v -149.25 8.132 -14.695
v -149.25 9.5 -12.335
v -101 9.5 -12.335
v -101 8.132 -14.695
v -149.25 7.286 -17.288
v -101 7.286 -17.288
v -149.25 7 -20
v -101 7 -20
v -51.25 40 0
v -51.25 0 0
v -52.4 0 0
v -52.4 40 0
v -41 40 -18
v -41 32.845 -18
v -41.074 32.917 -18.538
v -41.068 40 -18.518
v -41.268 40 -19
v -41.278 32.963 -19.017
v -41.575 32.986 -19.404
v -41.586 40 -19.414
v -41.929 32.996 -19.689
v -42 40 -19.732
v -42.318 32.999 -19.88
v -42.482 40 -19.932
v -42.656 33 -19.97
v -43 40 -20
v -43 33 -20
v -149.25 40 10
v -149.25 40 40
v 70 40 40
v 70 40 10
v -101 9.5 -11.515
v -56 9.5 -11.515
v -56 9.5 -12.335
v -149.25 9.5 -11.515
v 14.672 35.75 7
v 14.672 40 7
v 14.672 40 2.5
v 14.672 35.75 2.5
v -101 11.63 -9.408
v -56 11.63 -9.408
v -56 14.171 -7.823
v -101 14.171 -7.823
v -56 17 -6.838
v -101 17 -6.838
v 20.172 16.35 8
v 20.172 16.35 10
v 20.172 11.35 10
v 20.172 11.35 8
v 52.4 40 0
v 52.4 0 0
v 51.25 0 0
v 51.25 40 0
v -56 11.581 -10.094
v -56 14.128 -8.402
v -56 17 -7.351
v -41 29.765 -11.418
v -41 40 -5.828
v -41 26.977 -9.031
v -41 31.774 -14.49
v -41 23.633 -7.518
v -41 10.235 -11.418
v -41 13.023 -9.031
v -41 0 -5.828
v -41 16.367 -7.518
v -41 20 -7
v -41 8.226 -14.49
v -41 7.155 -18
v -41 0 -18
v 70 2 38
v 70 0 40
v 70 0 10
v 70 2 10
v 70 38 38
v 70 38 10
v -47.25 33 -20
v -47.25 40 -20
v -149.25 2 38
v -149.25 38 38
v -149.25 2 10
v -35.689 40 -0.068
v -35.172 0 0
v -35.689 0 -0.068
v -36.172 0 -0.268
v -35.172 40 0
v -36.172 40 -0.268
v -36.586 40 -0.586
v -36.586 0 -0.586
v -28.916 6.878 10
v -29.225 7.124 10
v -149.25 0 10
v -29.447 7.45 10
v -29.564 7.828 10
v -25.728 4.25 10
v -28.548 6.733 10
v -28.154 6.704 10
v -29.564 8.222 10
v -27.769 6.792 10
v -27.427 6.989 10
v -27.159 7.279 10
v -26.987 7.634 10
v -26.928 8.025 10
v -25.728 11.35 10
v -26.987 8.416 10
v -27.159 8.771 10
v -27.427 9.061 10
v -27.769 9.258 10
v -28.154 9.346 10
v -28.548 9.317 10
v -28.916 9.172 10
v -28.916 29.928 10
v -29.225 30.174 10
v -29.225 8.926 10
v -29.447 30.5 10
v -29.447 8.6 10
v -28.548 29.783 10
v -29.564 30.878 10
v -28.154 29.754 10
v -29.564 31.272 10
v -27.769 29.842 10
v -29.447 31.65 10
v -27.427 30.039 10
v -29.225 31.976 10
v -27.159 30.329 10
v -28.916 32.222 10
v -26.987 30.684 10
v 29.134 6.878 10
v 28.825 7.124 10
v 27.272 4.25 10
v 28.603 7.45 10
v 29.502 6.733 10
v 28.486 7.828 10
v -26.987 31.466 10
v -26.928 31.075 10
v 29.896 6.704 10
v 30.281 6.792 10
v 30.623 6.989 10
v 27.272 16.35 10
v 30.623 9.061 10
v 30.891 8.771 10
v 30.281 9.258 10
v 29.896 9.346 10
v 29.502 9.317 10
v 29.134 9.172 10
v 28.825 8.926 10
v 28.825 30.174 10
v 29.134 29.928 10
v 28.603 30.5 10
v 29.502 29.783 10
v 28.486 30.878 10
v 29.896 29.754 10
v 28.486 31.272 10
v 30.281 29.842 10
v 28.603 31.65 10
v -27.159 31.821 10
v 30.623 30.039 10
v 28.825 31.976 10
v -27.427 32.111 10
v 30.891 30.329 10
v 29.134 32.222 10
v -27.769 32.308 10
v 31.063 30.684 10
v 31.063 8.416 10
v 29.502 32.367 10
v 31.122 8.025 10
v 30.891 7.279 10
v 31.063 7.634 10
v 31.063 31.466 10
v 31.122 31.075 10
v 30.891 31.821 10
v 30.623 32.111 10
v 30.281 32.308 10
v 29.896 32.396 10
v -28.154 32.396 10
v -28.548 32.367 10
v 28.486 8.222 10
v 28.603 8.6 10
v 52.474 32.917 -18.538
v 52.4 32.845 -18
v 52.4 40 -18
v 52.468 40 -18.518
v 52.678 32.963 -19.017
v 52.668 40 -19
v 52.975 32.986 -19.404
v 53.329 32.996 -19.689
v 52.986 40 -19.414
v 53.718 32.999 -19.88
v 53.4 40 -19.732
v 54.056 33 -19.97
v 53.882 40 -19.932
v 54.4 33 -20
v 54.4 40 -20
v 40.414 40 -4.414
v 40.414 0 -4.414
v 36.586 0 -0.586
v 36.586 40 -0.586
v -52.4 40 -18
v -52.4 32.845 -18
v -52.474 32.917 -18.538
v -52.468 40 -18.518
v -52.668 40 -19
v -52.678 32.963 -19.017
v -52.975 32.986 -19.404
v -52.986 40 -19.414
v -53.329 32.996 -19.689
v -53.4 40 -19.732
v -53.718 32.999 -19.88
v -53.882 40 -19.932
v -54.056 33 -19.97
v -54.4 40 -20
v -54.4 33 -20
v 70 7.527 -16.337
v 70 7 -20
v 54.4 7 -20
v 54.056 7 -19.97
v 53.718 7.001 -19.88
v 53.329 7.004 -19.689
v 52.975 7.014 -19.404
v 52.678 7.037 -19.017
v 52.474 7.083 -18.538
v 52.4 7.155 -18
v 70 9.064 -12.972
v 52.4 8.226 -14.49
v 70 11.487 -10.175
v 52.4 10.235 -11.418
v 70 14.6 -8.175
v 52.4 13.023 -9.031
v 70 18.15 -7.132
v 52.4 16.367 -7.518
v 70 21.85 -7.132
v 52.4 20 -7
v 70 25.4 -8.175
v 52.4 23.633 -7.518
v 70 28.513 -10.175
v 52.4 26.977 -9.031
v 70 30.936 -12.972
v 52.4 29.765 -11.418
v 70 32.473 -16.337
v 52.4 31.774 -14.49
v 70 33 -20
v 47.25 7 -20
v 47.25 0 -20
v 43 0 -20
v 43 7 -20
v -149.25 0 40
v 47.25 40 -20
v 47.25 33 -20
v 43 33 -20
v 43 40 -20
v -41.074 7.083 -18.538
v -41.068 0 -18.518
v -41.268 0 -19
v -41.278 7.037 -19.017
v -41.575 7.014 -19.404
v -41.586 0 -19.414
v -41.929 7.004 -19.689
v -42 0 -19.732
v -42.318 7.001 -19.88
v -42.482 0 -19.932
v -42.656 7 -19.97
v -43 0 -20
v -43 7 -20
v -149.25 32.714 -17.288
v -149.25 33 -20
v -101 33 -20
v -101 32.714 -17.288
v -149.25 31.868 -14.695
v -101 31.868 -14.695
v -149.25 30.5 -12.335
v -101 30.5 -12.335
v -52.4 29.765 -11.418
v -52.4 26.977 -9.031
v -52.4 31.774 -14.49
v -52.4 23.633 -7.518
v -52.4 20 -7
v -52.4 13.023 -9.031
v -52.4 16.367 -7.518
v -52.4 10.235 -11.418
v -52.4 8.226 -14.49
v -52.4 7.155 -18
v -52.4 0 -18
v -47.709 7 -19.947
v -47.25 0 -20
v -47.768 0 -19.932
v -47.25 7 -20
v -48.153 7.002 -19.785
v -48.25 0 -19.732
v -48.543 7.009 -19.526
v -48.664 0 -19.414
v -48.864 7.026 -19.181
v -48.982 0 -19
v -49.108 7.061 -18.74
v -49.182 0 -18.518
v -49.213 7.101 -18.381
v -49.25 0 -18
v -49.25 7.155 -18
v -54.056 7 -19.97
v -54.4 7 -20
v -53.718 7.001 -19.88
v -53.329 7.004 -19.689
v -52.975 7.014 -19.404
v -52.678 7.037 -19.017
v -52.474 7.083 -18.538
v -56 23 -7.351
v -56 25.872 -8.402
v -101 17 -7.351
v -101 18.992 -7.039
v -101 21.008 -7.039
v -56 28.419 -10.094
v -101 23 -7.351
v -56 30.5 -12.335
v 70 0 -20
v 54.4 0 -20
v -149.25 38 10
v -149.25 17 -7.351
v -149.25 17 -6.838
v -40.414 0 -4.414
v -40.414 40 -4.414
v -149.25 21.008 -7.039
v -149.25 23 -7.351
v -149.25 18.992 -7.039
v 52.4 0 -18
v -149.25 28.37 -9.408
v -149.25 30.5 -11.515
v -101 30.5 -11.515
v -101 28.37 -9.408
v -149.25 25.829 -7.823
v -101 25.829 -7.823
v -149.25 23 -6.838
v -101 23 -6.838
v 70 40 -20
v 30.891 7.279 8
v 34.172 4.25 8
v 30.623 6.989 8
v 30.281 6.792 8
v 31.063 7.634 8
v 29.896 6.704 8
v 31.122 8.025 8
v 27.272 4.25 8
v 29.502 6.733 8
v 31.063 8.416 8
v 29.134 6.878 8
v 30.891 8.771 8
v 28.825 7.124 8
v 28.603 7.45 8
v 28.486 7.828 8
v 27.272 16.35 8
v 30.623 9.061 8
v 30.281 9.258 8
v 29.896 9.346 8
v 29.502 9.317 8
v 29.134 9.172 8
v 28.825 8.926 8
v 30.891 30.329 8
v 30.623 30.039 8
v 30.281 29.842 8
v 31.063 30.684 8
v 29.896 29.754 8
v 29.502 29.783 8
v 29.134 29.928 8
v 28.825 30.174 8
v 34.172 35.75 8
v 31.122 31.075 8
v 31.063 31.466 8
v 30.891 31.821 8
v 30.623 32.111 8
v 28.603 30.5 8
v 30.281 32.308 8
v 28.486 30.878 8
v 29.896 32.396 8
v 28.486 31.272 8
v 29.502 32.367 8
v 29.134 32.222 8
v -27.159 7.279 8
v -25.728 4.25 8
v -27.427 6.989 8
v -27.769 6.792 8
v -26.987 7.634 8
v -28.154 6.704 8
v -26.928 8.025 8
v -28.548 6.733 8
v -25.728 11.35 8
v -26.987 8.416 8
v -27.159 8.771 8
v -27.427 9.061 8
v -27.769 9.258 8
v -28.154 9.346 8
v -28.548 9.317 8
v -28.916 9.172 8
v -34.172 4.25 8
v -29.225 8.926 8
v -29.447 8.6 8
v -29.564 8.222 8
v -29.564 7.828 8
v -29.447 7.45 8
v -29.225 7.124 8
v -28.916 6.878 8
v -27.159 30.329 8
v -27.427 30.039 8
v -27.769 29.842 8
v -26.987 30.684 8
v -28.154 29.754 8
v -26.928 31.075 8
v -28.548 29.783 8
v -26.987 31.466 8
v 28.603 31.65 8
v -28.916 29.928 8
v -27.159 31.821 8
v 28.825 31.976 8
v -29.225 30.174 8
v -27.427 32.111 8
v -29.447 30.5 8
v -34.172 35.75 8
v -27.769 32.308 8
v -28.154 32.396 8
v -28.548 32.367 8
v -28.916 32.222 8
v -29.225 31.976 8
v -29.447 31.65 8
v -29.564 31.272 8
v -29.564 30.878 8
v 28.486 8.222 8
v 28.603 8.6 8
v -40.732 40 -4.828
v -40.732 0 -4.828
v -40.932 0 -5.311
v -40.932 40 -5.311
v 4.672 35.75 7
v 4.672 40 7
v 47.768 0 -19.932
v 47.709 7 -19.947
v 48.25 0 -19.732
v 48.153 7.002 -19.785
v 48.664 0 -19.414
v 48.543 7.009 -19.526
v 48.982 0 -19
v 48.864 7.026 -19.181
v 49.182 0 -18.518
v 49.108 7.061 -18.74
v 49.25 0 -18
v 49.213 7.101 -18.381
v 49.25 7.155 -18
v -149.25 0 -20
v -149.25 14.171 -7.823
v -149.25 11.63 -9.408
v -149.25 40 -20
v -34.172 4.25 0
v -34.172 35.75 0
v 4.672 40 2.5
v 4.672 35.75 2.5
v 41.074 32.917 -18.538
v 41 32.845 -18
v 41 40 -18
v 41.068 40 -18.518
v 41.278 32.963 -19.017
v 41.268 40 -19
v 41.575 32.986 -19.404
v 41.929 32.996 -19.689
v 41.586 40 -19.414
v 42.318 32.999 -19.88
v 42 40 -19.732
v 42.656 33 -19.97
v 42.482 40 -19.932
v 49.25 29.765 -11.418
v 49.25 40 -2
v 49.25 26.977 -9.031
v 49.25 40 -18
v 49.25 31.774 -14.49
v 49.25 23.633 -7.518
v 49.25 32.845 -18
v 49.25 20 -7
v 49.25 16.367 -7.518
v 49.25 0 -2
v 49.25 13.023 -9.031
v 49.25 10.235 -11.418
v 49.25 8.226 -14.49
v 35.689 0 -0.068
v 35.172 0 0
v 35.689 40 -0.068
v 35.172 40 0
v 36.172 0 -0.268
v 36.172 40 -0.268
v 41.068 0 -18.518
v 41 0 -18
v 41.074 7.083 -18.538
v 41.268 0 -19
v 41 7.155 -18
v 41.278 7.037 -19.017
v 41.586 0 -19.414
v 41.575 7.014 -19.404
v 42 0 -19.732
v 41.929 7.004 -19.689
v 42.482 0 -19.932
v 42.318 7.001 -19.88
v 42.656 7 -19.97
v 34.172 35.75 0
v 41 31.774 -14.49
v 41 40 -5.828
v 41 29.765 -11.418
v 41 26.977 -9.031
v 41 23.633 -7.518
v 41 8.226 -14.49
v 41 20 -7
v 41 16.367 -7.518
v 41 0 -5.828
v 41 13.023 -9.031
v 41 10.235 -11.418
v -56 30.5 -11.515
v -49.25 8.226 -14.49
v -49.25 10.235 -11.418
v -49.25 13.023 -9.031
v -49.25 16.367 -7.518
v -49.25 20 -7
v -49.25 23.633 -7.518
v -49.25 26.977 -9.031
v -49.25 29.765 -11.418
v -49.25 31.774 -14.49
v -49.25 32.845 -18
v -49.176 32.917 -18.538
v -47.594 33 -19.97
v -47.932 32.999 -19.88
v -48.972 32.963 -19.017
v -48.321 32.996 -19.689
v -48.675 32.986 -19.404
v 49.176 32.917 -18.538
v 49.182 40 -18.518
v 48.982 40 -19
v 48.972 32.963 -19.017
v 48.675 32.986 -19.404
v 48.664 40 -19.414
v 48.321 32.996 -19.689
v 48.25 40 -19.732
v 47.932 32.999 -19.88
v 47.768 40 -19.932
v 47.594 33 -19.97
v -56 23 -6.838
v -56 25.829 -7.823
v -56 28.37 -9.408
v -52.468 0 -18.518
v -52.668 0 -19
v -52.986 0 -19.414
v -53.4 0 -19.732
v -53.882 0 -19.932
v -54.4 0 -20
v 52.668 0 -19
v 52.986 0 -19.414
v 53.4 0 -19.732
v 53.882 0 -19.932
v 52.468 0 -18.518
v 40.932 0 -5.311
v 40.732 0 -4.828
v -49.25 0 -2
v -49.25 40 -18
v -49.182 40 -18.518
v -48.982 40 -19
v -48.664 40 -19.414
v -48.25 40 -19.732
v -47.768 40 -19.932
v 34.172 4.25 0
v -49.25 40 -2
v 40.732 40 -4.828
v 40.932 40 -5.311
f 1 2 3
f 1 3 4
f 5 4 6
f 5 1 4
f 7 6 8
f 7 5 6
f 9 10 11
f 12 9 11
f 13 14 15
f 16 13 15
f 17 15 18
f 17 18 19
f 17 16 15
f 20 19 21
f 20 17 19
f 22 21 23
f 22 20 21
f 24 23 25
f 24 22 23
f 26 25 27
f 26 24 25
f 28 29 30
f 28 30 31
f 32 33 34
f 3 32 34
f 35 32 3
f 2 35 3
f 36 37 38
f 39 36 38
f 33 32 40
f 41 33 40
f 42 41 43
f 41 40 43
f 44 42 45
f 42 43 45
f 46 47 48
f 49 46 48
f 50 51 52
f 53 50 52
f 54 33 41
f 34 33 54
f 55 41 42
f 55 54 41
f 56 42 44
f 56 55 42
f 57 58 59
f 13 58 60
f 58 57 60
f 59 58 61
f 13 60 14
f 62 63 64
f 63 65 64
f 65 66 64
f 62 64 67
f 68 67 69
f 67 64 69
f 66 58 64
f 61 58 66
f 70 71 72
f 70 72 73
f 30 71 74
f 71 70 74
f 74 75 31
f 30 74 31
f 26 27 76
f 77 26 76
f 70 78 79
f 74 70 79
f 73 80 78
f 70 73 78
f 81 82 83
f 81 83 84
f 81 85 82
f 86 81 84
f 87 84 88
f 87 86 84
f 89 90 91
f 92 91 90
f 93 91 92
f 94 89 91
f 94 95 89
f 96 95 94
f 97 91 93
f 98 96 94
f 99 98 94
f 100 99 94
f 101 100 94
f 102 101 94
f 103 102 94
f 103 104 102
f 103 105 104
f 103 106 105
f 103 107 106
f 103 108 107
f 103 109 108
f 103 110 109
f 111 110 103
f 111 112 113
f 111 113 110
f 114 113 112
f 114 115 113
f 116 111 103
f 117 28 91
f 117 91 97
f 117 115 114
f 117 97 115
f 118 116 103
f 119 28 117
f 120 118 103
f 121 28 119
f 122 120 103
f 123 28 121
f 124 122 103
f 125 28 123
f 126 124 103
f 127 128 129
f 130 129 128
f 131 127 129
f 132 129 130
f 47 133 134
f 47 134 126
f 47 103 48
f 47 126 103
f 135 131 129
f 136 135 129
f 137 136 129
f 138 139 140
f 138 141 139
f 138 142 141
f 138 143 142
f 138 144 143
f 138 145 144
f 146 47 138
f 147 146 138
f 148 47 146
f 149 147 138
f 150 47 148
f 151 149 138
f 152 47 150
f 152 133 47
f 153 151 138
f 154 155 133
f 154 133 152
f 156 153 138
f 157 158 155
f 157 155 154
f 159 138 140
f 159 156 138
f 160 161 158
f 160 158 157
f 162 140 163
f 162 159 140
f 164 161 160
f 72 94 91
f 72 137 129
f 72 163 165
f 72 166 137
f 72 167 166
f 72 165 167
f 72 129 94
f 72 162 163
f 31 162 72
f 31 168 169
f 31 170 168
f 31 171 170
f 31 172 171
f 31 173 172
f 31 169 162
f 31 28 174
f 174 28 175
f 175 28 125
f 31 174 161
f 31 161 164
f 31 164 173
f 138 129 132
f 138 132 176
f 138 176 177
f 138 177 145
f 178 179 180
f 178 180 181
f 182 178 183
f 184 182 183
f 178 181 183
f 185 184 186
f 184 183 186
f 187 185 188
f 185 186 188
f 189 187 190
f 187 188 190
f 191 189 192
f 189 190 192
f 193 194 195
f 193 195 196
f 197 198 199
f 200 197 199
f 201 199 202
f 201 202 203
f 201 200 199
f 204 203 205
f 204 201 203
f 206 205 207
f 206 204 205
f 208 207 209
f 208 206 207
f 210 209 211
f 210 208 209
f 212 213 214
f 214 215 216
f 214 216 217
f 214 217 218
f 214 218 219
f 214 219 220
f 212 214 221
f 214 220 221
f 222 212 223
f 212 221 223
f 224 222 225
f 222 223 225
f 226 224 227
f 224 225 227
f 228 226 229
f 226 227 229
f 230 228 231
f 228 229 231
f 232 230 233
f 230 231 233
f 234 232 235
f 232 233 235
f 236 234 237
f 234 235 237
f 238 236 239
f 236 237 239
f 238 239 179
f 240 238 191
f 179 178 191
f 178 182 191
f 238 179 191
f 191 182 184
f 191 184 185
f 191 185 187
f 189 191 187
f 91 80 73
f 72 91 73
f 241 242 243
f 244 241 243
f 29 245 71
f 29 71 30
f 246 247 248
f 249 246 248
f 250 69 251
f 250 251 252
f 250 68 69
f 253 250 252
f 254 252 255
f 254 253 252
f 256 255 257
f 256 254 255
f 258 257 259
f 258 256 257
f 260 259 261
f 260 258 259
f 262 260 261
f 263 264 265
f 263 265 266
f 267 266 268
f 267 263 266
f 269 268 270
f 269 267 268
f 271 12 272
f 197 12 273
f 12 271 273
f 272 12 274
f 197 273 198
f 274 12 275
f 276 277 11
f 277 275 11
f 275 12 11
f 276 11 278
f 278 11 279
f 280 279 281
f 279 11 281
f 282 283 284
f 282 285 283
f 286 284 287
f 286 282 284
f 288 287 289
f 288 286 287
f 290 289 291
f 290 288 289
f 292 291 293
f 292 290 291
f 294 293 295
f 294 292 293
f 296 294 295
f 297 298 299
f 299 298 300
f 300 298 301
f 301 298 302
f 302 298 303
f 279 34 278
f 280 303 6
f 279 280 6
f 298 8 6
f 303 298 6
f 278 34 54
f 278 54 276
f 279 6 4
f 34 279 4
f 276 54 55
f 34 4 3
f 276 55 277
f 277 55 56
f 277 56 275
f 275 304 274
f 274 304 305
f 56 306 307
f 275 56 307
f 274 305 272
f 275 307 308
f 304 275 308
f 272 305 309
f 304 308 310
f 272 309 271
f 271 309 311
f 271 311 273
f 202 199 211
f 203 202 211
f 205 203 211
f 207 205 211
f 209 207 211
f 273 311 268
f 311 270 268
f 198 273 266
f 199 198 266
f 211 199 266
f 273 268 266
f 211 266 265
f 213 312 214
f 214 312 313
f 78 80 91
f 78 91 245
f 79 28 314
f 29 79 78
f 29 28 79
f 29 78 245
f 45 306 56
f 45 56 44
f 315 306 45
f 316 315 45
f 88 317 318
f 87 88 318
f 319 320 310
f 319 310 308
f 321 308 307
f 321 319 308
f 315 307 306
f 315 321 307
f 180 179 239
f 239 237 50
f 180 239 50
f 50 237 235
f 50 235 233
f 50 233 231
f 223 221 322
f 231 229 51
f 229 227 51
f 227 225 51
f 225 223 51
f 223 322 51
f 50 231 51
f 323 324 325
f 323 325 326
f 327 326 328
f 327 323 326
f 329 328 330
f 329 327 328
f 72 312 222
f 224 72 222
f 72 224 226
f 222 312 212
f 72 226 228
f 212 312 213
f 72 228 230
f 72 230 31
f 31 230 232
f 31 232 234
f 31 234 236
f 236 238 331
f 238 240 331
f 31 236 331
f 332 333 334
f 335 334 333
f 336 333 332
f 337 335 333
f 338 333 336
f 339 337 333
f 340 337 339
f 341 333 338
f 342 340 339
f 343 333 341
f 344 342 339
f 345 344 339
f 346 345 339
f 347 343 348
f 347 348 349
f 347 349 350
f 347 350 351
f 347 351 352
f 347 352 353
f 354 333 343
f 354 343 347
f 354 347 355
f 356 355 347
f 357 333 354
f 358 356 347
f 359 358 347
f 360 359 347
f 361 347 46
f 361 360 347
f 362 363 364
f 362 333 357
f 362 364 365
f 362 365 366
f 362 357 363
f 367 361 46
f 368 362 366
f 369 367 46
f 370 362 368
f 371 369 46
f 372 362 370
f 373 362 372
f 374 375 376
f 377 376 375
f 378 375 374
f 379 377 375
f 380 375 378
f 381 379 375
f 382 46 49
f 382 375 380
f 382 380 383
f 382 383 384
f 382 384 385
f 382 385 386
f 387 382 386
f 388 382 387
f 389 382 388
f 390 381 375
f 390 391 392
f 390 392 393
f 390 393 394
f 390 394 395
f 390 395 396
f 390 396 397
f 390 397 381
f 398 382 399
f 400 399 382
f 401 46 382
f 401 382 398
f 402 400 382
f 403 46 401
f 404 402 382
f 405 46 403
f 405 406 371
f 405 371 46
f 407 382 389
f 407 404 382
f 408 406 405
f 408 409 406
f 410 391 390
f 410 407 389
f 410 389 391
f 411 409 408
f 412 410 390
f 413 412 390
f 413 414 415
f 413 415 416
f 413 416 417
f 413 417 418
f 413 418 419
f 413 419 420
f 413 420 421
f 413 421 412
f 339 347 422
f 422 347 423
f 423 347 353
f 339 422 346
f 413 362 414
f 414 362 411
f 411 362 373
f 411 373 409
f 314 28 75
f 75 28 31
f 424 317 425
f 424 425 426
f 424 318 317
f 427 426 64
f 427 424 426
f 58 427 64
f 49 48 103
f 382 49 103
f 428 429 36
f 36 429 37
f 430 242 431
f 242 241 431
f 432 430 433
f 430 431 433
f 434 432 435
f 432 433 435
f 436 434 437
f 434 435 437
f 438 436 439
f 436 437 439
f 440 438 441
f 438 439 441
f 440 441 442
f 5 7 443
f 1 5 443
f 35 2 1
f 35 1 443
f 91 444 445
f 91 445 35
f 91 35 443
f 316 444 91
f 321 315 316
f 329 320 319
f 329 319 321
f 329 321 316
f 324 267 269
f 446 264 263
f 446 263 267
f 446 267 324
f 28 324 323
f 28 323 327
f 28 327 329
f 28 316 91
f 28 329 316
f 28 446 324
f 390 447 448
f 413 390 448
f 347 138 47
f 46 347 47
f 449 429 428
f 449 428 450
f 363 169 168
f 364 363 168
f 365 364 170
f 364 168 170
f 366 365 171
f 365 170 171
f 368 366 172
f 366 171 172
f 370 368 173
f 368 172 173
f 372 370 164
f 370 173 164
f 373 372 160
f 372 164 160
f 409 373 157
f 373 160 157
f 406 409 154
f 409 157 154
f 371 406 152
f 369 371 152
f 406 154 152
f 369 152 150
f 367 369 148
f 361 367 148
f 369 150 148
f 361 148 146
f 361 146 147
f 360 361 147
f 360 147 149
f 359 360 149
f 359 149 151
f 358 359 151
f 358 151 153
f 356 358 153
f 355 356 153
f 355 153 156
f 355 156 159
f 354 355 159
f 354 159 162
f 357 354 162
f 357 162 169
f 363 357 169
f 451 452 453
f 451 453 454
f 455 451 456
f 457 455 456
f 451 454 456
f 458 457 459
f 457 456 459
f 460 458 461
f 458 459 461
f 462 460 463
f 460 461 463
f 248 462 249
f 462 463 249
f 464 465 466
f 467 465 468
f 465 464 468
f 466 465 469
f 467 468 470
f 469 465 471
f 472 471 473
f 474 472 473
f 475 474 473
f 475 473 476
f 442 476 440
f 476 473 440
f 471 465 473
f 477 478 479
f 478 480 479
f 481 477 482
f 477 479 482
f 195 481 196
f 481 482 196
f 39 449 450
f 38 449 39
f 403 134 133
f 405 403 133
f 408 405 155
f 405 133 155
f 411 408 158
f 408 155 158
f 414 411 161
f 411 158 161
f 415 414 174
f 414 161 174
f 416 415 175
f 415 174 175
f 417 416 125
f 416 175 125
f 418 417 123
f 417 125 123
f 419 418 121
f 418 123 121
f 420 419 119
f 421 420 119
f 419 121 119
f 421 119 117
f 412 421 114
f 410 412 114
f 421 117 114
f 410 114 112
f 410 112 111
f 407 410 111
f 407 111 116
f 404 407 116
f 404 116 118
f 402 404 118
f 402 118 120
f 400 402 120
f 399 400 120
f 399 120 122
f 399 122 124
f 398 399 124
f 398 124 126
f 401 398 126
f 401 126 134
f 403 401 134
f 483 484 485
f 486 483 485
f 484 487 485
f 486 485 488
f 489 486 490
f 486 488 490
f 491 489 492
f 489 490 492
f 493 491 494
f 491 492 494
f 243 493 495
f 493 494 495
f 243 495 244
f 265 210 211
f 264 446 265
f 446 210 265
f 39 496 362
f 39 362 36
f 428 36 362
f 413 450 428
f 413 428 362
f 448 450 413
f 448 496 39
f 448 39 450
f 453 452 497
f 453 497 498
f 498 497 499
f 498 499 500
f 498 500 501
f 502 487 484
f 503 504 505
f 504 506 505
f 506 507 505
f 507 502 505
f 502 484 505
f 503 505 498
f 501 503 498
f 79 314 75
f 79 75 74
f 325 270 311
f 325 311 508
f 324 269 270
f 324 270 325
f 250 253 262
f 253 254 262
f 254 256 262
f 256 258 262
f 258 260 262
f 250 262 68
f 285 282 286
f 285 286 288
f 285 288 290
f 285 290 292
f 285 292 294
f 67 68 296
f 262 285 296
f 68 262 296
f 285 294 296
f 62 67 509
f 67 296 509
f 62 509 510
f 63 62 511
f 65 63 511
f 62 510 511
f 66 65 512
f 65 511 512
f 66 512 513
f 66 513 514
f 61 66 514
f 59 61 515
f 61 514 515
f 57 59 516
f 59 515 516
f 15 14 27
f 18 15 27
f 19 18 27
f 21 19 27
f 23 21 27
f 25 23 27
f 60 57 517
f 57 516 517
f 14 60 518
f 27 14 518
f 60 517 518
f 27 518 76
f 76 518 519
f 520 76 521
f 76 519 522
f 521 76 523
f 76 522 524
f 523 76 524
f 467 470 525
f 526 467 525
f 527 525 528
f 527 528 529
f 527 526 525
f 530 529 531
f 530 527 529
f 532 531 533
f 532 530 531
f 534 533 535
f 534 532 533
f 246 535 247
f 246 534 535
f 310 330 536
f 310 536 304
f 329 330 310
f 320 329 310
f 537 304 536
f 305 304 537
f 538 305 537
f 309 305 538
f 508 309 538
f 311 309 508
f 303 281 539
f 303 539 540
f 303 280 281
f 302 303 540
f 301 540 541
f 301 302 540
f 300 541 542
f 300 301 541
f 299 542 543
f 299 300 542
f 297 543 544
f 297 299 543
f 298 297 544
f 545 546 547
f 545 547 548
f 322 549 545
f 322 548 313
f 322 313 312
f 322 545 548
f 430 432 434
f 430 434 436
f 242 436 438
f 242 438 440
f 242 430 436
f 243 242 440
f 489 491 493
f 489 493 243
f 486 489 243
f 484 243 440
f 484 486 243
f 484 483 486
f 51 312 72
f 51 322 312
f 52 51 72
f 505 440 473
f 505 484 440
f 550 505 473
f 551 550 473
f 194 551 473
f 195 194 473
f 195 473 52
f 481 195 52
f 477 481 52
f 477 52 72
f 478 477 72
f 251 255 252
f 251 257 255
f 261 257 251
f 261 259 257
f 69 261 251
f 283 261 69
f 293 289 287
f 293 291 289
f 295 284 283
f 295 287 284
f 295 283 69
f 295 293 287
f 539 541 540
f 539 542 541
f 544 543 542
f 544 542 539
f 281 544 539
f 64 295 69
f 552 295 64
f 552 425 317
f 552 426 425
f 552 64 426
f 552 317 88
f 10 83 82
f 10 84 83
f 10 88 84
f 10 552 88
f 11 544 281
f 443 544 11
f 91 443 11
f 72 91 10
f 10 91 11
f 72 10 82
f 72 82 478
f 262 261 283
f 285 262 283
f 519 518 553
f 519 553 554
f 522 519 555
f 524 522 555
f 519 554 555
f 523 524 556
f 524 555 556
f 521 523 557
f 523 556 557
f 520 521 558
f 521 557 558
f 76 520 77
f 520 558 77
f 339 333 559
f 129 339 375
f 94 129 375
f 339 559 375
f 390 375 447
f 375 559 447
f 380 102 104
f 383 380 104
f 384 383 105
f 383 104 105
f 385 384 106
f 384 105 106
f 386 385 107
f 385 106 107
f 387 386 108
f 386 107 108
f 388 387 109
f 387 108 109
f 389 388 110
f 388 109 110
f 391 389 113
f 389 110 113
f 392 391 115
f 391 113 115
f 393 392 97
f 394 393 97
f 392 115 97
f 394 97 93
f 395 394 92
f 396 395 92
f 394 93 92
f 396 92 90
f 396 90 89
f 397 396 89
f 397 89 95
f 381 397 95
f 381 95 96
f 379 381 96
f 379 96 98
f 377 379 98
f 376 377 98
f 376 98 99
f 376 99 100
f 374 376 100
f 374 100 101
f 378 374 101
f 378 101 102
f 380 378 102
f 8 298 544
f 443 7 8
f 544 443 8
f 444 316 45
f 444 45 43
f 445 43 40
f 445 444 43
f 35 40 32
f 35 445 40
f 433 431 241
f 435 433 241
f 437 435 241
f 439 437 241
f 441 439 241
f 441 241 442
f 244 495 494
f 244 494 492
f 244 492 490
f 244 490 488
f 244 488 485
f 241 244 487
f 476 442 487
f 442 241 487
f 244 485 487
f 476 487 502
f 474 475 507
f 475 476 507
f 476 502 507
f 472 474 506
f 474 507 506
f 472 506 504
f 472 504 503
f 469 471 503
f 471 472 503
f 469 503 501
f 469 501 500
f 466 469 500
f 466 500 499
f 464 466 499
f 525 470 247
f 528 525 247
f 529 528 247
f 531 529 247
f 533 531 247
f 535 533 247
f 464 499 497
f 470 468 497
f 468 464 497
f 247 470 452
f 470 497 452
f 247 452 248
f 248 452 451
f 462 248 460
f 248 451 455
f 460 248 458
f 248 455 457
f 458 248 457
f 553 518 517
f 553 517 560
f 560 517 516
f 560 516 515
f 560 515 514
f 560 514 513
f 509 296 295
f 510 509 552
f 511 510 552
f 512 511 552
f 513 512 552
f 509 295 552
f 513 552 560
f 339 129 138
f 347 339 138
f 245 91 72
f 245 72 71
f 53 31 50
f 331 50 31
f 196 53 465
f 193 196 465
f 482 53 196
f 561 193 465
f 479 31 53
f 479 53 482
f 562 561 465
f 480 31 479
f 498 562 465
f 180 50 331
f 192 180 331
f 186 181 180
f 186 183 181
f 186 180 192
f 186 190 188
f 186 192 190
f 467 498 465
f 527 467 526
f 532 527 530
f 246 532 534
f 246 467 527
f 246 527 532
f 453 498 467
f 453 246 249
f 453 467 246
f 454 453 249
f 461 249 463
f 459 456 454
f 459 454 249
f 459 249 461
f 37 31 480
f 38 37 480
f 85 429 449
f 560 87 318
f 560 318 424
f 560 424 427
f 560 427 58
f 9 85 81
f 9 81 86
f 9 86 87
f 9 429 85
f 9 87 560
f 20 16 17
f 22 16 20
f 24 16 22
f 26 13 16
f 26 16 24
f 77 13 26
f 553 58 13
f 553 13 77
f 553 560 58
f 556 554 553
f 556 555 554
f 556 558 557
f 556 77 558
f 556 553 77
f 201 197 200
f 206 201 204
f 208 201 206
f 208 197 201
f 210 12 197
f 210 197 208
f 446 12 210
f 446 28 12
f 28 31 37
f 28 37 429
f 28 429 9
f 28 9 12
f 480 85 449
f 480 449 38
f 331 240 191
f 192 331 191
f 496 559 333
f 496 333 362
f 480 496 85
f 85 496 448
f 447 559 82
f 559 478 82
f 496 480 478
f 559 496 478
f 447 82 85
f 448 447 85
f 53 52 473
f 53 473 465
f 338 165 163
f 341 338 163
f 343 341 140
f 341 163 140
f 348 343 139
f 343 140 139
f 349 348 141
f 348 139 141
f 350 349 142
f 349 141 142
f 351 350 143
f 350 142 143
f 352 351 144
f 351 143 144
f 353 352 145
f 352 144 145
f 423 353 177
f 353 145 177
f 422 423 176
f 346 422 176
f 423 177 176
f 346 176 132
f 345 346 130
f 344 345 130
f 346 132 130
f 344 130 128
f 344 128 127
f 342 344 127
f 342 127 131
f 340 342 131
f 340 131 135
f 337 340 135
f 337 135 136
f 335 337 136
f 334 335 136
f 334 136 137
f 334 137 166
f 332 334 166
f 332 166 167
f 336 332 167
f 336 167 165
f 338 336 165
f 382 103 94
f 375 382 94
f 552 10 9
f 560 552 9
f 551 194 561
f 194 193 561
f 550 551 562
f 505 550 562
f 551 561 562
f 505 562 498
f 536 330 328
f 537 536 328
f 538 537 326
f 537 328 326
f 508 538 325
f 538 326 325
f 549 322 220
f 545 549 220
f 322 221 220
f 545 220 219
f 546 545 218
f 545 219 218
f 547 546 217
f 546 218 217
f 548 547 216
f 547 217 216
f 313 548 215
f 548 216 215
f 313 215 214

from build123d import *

# Parameters (mm, degrees)
BOSS_EXTRUDE1_DEPTH     = 40
SKETCH2_R               = 13
CUT_EXTRUDE1_DEPTH      = 210.771304043
CHAMFER1_SIZE           = 5
FILLET3_R               = 2
CHAMFER2_SIZE           = 2
CUT_EXTRUDE2_REACH      = 126.101
CUT_EXTRUDE2_END_RADIUS = 13.5
SKETCH3_W               = 45
SKETCH3_H               = 7.5
SKETCH4_W               = 68.34314575
SKETCH4_H               = 31.5
CUT_EXTRUDE3_DEPTH      = 8
BOSS_EXTRUDE2_START     = 48.25
BOSS_EXTRUDE2_DEPTH     = 48.25
SKETCH6_W               = 28
SKETCH6_H               = 36
CUT_EXTRUDE4_DEPTH      = 257.563954128
CUT_EXTRUDE5_REACH      = 161.611
SKETCH7_W               = 10
SKETCH7_H               = 4.5
SKETCH9_R               = 1.325
CUT_EXTRUDE6_DEPTH      = 158.402549261
SKETCH10_W              = 31
SKETCH10_H              = 40
CUT_EXTRUDE7_DEPTH      = 166.757541331


with BuildPart() as part:
    # Sketch1 → Boss-Extrude1 (new body)
    with BuildSketch(Plane(origin=(0, 0, 0), x_dir=(1, 0, 0), z_dir=(0, 1, 0))):
        Polygon((41, 0), (-41, 0), (-41, 20), (-49.25, 20), (-49.25, 0), (-52.4, 0), (-52.4, 20), (-101, 20), (-101, -40), (101, -40), (101, 20), (52.4, 20), (52.4, 0), (49.25, 0), (49.25, 20), (41, 20), align=None)
    extrude(amount=BOSS_EXTRUDE1_DEPTH)

    # Sketch2 → Cut-Extrude1 (cut, through all)
    with BuildSketch(Plane.ZY.offset(101)):
        with Locations((-20, 20)):
            Circle(SKETCH2_R)
    extrude(amount=-CUT_EXTRUDE1_DEPTH, mode=Mode.SUBTRACT)

    # Chamfer1
    chamfer1_edges = [part.edges().sort_by_distance(p)[0] for p in [
        (-41, 20, 0),
        (41, 20, 0),
    ]]
    chamfer(chamfer1_edges, length=CHAMFER1_SIZE)

    # Fillet3
    fillet3_edges = [part.edges().sort_by_distance(p)[0] for p in [
        (41, 36.5, -20),
        (49.25, 36.5, -20),
        (52.4, 36.5, -20),
        (-52.4, 36.5, -20),
        (-49.25, 36.5, -20),
        (-41, 36.5, -20),
        (41, 3.5, -20),
        (49.25, 3.5, -20),
        (52.4, 3.5, -20),
        (-52.4, 3.5, -20),
        (-49.25, 3.5, -20),
        (-41, 3.5, -20),
        (-36, 20, 0),
        (36, 20, 0),
        (41, 20, -5),
        (-41, 20, -5),
    ]]
    fillet(fillet3_edges, radius=FILLET3_R)

    # Chamfer2
    chamfer2_edges = [part.edges().sort_by_distance(p)[0] for p in [
        (49.25, 20, 0),
        (-49.25, 20, 0),
    ]]
    chamfer(chamfer2_edges, length=CHAMFER2_SIZE)

    # Cut-Extrude2: up to this cylinder (the profile starts inside it)
    cut_extrude2_end = Plane(origin=(-78.5, 20, -20), z_dir=(-1, 0, 0)) * Cylinder(CUT_EXTRUDE2_END_RADIUS, 280.202, mode=Mode.PRIVATE)
    # Sketch3 → Cut-Extrude2 (cut, up to the surface)
    with BuildSketch(Plane(origin=(0, 0, -20), x_dir=(-1, 0, 0), z_dir=(0, 0, -1)), mode=Mode.PRIVATE) as cut_extrude2_sk1:
        with Locations((78.5, 13.25)):
            Rectangle(SKETCH3_W, SKETCH3_H)
    cut_extrude2_tool1 = extrude(cut_extrude2_sk1.sketch, amount=-CUT_EXTRUDE2_REACH, mode=Mode.PRIVATE) & cut_extrude2_end
    add(cut_extrude2_tool1.solids().sort_by_distance((-78.5, 13.25, -20))[0], mode=Mode.SUBTRACT)
    # Sketch3 → Cut-Extrude2 (cut, up to the surface)
    with BuildSketch(Plane(origin=(0, 0, -20), x_dir=(-1, 0, 0), z_dir=(0, 0, -1)), mode=Mode.PRIVATE) as cut_extrude2_sk2:
        with Locations((78.5, 26.75)):
            Rectangle(SKETCH3_W, SKETCH3_H)
    cut_extrude2_tool2 = extrude(cut_extrude2_sk2.sketch, amount=-CUT_EXTRUDE2_REACH, mode=Mode.PRIVATE) & cut_extrude2_end
    add(cut_extrude2_tool2.solids().sort_by_distance((-78.5, 26.75, -20))[0], mode=Mode.SUBTRACT)

    # Sketch4 → Cut-Extrude3 (cut)
    with BuildSketch(Plane(origin=(0, 0, 0), x_dir=(-1, 0, 0), z_dir=(0, 0, -1))):
        with Locations((0, 20)):
            Rectangle(SKETCH4_W, SKETCH4_H)
    extrude(amount=-CUT_EXTRUDE3_DEPTH, mode=Mode.SUBTRACT)

    # Sketch5 → Boss-Extrude2 (add)
    with BuildSketch(Plane.ZY.offset(101).offset(BOSS_EXTRUDE2_START)):
        with BuildLine():
            Line((-20, 7), (-20, 0))
            Line((-20, 0), (40, 0))
            Line((40, 0), (40, 40))
            Line((40, 40), (-20, 40))
            Line((-20, 40), (-20, 33))
            ThreePointArc((-20, 33), (-15.968871126, 32.359207094), (-12.335145142, 30.5))
            Line((-12.335145142, 30.5), (-11.514718626, 30.5))
            ThreePointArc((-11.514718626, 30.5), (-8.544934247, 27.143631331), (-6.837553419, 23))
            Line((-6.837553419, 23), (-7.350889359, 23))
            ThreePointArc((-7.350889359, 23), (-7, 20), (-7.350889359, 17))
            Line((-7.350889359, 17), (-6.837553419, 17))
            ThreePointArc((-6.837553419, 17), (-8.544934247, 12.856368669), (-11.514718626, 9.5))
            Line((-11.514718626, 9.5), (-12.335145142, 9.5))
            ThreePointArc((-12.335145142, 9.5), (-15.968871126, 7.640792906), (-20, 7))
        make_face()
    extrude(amount=-BOSS_EXTRUDE2_DEPTH)

    # Sketch6 → Cut-Extrude4 (cut, through all)
    with BuildSketch(Plane.ZY.offset(149.25)):
        with Locations((24, 20)):
            Rectangle(SKETCH6_W, SKETCH6_H)
    extrude(amount=-CUT_EXTRUDE4_DEPTH, mode=Mode.SUBTRACT)

    # Sketch7 → Cut-Extrude5 (cut, up to next)
    with BuildSketch(Plane(origin=(0, 40, 0), x_dir=(1, 0, 0), z_dir=(0, 1, 0)), mode=Mode.PRIVATE) as cut_extrude5_sk1:
        with Locations((9.671572875, -4.75)):
            Rectangle(SKETCH7_W, SKETCH7_H)
    cut_extrude5_tool1 = extrude(cut_extrude5_sk1.sketch, amount=-CUT_EXTRUDE5_REACH, mode=Mode.PRIVATE) & part.part
    add(cut_extrude5_tool1.solids().sort_by_distance((9.671573, 40, 4.75))[0], mode=Mode.SUBTRACT)

    # Sketch9 → Cut-Extrude6 (cut, through all)
    with BuildSketch(Plane.XY.offset(10)):
        Polygon((20.171572875, 11.35), (-25.728427125, 11.35), (-25.728427125, 4.25), (27.271572875, 4.25), (27.271572875, 16.35), (20.171572875, 16.35), align=None)
        with Locations((29.796572875, 8.025)):
            Circle(SKETCH9_R)
        with Locations((29.796572875, 31.075)):
            Circle(SKETCH9_R)
        with Locations((-28.253427125, 8.025)):
            Circle(SKETCH9_R)
        with Locations((-28.253427125, 31.075)):
            Circle(SKETCH9_R)
    extrude(amount=-CUT_EXTRUDE6_DEPTH, mode=Mode.SUBTRACT)

    # Sketch10 → Cut-Extrude7 (cut, through all)
    with BuildSketch(Plane(origin=(0, 0, -20), x_dir=(-1, 0, 0), z_dir=(0, 0, -1))):
        with Locations((-85.5, 20)):
            Rectangle(SKETCH10_W, SKETCH10_H)
    extrude(amount=-CUT_EXTRUDE7_DEPTH, mode=Mode.SUBTRACT)


with BuildPart() as body_2:
    # Split1: the piece on the far side of the plane
    add(part.part)
    split(bisect_by=Plane.XY.offset(10), keep=Keep.BOTTOM)


with BuildPart() as part_1:
    add(part.part)

    # Split1
    split(bisect_by=Plane.XY.offset(10), keep=Keep.TOP)


solid = Compound([body_2.part, part_1.part])
